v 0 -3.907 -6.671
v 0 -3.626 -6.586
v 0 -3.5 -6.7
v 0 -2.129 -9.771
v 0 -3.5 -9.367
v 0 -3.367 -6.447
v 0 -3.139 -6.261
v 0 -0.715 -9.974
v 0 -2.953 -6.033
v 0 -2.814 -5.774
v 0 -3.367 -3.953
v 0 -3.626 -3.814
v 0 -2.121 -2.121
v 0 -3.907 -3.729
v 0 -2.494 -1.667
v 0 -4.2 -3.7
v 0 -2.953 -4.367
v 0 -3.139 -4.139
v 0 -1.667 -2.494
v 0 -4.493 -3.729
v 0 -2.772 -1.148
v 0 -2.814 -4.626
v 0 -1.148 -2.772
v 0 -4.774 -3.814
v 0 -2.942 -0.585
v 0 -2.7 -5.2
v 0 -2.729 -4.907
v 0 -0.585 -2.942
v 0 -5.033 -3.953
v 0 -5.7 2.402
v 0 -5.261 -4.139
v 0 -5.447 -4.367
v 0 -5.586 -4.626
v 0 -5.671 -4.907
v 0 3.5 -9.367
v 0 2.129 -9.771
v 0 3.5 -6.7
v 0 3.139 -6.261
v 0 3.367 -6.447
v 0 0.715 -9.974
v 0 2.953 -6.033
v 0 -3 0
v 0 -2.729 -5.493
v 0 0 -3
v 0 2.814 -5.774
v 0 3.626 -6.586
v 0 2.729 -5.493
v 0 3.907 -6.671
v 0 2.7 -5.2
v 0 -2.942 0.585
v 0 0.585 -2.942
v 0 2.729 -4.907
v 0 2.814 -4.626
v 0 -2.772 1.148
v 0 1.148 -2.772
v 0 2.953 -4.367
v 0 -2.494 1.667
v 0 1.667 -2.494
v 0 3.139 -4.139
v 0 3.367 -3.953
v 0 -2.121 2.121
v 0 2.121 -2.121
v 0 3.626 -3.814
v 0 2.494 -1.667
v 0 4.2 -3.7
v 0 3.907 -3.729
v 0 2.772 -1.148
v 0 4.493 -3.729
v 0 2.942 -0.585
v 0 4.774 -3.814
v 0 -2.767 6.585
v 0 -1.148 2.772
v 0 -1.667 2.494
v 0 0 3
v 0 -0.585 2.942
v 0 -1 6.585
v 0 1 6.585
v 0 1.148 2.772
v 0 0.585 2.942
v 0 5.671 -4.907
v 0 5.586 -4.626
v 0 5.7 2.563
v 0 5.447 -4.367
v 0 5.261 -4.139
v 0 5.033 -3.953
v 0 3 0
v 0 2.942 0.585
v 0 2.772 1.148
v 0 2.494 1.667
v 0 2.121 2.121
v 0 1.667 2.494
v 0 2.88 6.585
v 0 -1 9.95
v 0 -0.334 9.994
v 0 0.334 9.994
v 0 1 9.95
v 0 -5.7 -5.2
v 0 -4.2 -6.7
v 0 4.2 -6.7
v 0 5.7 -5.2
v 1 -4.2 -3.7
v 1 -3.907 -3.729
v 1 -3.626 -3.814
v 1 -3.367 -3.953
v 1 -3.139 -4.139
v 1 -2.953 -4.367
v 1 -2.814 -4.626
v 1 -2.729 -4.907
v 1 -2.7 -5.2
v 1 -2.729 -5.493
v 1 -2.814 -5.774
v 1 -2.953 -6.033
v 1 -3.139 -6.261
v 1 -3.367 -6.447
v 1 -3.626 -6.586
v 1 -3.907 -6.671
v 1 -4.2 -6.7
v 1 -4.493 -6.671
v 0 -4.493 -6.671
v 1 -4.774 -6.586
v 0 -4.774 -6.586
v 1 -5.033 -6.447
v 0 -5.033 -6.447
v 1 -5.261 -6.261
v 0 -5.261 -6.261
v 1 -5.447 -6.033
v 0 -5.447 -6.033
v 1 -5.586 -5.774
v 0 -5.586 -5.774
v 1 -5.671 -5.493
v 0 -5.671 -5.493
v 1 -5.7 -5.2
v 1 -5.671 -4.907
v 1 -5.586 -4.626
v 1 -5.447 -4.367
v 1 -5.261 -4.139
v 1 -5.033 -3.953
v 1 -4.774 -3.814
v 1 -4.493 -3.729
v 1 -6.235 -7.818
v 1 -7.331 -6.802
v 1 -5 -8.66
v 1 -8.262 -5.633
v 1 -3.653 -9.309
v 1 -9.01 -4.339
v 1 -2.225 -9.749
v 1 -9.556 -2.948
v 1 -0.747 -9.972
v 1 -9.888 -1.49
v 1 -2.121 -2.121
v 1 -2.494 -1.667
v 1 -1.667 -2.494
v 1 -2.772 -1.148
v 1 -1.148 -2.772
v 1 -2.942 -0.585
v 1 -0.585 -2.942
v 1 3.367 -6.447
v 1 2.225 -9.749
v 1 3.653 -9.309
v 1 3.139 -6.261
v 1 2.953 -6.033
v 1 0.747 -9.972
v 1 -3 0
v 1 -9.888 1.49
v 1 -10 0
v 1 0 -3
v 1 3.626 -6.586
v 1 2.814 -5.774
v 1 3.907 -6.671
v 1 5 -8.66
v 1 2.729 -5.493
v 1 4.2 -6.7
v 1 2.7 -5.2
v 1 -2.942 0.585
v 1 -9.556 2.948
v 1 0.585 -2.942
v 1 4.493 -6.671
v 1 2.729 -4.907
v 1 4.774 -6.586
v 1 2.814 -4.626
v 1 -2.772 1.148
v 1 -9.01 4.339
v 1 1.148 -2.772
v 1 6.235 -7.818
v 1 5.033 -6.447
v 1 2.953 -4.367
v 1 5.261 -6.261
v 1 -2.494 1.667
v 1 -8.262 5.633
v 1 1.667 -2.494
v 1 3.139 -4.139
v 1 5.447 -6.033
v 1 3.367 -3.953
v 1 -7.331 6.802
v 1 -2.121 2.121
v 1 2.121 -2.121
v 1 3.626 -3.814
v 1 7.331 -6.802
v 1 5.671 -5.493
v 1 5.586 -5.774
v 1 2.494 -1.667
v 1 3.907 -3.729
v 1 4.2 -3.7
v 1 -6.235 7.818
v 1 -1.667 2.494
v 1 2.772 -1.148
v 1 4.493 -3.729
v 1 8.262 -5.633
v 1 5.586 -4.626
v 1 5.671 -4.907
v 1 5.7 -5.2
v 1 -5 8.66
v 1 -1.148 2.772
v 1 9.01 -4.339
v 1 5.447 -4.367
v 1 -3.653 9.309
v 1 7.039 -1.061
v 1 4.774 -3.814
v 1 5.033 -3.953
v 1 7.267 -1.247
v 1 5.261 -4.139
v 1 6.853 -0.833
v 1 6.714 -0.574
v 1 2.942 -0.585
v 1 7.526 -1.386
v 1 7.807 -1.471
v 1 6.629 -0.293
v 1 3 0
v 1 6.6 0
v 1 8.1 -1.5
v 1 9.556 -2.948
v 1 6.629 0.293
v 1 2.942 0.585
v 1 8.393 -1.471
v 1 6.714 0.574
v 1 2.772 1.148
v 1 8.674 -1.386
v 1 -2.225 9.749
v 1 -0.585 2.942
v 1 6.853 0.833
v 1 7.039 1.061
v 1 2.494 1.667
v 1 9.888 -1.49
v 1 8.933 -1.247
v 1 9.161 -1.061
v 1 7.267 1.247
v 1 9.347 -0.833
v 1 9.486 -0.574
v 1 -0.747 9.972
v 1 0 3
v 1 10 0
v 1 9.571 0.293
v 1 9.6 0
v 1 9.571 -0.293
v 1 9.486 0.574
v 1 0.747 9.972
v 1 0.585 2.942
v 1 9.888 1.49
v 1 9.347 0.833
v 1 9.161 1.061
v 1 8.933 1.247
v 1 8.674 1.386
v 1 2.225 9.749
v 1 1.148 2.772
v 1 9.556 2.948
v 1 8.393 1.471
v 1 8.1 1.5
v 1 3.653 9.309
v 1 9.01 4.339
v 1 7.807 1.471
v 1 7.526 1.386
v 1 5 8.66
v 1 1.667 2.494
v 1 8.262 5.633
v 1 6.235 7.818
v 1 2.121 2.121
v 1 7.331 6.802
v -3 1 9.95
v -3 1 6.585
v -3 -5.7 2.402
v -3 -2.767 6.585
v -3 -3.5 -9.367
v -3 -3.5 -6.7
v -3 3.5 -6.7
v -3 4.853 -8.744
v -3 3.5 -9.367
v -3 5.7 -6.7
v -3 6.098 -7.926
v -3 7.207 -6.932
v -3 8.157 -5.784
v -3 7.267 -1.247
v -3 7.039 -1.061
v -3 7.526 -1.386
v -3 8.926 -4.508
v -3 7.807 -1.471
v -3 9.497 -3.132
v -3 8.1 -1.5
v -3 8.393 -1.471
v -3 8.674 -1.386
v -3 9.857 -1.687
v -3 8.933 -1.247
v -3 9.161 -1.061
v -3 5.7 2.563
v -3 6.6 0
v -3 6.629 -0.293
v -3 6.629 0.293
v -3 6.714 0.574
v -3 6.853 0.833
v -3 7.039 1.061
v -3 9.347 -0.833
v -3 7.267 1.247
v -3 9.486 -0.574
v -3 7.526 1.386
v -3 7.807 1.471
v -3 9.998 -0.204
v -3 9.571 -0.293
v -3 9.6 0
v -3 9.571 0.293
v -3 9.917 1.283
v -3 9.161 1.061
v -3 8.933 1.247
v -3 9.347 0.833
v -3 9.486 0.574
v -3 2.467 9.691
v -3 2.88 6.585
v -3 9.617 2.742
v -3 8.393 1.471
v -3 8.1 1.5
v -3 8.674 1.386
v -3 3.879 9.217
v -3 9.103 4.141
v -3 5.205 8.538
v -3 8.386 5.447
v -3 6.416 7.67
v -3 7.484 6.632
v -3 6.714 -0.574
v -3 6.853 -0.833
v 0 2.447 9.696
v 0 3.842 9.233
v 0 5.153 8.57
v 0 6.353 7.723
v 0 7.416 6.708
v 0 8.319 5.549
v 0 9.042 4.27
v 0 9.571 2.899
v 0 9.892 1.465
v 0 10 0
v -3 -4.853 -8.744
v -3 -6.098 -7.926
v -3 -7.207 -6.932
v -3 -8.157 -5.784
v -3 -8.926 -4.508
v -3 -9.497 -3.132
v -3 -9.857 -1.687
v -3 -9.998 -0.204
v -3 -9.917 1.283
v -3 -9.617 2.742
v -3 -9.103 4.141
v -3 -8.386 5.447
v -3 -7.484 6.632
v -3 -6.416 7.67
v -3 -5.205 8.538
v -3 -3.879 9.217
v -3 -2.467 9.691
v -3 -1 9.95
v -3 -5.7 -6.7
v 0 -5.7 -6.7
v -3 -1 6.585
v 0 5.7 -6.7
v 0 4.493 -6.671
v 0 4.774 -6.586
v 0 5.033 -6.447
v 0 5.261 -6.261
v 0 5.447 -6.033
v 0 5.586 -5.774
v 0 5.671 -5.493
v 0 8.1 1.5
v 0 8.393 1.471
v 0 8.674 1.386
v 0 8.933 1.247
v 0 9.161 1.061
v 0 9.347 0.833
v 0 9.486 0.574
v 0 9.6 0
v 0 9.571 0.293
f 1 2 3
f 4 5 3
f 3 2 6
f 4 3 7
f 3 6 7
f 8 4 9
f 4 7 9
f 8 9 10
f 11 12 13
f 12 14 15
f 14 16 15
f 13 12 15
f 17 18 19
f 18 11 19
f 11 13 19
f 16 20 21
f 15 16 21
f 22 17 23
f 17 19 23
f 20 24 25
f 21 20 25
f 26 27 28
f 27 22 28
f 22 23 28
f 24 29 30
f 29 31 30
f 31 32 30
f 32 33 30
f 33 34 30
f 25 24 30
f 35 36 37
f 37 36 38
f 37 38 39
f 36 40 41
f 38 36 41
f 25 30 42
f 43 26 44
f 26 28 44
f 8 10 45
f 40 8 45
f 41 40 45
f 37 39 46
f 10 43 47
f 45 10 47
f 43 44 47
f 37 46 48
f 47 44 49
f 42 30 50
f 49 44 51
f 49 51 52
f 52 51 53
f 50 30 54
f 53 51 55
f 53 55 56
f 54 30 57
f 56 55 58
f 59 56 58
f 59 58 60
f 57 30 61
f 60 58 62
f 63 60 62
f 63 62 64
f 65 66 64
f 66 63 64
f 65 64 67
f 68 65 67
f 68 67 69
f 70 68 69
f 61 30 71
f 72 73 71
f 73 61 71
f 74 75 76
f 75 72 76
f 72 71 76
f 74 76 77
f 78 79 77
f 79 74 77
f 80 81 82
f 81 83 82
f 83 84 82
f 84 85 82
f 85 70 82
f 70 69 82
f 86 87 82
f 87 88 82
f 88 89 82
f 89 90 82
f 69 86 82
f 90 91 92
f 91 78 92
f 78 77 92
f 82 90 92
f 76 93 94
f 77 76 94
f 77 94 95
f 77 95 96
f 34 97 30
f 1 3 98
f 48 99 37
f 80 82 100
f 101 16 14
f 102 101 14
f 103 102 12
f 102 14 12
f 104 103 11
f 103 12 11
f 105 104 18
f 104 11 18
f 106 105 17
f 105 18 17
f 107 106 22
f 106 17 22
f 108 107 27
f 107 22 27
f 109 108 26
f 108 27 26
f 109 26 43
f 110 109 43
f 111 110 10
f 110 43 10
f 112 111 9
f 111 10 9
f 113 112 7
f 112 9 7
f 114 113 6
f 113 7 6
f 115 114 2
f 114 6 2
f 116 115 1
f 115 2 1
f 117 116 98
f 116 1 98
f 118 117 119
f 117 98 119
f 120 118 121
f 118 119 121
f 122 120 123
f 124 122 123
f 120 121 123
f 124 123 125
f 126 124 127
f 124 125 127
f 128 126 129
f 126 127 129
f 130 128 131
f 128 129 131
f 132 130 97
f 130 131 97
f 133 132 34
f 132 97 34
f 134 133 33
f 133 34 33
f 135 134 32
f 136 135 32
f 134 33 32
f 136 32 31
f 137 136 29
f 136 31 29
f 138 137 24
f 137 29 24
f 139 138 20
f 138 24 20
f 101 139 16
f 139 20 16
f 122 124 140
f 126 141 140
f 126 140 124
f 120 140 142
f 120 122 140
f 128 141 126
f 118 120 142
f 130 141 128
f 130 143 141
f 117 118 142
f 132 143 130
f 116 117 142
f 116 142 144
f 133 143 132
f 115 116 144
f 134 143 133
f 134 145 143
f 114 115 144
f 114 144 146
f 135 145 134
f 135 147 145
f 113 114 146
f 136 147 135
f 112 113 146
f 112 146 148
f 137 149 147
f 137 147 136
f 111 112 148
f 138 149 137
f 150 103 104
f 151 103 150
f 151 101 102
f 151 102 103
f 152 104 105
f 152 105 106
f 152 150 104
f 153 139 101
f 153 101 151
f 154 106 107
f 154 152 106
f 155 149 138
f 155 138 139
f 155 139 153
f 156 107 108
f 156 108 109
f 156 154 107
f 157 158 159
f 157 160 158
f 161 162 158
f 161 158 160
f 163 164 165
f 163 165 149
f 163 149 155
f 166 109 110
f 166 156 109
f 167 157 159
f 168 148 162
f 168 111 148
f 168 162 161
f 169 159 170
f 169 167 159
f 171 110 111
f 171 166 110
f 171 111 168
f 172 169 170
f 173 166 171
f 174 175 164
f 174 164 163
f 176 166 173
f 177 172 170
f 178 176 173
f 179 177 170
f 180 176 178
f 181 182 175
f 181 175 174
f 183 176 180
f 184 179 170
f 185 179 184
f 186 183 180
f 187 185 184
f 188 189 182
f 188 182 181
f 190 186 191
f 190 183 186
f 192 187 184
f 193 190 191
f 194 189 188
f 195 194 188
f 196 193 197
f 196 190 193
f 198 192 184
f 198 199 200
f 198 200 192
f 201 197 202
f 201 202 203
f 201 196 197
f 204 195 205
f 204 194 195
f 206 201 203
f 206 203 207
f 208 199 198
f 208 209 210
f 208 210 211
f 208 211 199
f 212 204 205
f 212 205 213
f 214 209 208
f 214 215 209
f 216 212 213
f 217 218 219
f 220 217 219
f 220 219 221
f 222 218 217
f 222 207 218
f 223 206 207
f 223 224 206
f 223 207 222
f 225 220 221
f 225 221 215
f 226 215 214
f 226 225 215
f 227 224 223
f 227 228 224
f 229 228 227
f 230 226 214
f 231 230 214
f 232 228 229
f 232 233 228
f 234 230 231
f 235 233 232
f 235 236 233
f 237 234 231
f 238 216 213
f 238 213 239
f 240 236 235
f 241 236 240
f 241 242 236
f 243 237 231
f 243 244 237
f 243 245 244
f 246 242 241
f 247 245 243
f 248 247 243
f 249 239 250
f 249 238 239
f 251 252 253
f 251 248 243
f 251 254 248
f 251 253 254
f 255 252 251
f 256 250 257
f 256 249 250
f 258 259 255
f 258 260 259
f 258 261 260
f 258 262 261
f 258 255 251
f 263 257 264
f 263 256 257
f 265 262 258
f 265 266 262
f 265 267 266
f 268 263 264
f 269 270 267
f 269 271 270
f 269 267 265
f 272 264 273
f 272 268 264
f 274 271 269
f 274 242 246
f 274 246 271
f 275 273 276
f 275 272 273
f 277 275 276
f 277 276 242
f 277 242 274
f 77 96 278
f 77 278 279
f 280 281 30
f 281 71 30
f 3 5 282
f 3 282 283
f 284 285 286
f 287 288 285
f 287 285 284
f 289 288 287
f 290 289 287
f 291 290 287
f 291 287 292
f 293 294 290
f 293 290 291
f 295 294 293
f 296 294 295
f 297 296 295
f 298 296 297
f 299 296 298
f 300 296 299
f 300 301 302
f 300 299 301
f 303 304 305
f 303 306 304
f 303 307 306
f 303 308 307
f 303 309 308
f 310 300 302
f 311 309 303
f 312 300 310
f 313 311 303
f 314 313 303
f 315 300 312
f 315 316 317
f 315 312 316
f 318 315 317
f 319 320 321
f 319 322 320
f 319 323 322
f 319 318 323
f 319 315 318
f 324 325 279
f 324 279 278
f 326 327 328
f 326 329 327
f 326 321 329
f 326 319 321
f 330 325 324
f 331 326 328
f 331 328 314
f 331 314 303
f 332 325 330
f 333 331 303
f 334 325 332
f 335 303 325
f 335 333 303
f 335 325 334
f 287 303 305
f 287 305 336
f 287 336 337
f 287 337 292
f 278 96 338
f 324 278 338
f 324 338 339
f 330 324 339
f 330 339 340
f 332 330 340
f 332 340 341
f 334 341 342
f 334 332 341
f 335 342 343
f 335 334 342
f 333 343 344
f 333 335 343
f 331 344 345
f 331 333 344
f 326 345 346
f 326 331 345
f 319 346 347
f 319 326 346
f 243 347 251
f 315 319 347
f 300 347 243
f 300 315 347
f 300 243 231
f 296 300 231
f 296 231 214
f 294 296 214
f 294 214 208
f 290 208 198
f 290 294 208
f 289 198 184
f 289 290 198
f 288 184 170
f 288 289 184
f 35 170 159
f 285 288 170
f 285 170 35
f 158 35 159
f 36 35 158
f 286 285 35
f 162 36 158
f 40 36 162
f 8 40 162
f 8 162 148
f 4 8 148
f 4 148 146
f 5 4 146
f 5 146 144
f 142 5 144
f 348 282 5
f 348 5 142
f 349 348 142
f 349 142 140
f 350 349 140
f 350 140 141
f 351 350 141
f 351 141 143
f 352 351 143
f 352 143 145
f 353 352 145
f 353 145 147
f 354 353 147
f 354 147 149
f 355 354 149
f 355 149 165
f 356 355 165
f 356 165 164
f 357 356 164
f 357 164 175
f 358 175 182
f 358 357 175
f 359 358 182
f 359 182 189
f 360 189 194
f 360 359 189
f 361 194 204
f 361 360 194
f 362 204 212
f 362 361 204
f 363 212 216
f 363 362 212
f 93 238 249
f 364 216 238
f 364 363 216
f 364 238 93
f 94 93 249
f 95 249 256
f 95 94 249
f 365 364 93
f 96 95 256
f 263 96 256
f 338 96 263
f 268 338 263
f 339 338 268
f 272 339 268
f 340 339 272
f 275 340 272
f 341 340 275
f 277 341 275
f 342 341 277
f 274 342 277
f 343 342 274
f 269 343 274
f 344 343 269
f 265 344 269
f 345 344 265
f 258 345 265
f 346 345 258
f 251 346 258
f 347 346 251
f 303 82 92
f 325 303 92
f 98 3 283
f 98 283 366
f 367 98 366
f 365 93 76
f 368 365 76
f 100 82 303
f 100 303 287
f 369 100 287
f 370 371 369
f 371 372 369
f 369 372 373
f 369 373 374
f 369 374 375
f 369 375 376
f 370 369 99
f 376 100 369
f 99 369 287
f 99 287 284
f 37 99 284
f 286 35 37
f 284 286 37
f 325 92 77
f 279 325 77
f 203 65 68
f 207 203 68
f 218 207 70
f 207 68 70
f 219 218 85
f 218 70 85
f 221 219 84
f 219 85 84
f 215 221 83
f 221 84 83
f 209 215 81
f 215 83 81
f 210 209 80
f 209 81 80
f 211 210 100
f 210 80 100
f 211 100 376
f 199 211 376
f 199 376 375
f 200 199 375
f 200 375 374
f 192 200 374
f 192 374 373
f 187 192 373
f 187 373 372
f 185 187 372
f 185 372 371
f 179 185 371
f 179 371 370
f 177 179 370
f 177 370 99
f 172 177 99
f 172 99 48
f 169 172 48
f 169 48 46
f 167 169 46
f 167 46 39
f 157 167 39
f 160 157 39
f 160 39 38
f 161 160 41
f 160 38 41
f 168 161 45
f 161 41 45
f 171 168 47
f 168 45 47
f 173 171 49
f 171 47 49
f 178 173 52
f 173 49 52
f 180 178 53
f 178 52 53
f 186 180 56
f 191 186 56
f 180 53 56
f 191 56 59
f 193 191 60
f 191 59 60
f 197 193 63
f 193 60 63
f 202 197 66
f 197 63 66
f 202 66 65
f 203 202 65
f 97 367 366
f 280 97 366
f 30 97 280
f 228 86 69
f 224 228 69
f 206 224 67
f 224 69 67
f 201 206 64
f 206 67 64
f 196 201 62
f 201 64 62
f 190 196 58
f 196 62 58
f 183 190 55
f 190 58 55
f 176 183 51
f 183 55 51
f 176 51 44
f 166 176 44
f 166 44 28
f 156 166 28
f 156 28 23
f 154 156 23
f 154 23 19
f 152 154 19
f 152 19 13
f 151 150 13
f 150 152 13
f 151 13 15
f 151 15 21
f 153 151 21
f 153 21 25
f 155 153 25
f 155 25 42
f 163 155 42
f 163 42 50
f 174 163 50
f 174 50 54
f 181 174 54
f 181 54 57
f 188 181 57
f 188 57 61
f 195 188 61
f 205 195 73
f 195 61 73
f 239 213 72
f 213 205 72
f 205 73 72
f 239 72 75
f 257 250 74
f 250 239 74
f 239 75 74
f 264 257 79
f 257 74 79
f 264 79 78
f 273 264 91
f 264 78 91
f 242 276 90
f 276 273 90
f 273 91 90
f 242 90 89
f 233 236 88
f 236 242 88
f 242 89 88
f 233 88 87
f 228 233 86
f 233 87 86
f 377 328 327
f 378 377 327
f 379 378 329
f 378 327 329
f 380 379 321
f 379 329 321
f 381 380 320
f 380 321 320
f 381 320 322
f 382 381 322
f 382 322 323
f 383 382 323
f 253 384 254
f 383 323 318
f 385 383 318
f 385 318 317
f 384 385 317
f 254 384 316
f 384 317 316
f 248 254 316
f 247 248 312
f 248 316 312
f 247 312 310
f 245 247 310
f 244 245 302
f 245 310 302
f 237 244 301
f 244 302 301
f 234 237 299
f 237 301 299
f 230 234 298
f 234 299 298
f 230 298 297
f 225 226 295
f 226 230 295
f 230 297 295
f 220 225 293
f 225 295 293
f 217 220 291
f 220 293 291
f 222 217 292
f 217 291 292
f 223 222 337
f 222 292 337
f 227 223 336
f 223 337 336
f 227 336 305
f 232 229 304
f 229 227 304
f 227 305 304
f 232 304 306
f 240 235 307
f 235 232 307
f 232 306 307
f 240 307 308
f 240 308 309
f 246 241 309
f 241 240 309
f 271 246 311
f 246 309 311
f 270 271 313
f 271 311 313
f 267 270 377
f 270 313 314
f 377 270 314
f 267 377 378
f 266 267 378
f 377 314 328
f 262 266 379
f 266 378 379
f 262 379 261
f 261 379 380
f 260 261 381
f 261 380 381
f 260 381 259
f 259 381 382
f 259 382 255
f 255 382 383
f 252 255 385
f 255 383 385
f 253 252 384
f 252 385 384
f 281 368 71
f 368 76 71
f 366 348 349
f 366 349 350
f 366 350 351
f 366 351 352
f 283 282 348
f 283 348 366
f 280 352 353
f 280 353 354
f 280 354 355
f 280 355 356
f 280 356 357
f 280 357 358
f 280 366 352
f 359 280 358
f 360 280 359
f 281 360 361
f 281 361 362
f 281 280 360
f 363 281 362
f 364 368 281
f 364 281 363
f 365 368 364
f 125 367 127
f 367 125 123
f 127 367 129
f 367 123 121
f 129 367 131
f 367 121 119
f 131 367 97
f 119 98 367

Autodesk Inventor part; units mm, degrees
ref_plane "YZ Plane" through (0, 0, 0) normal (1, 0, 0) x (0, 1, 0)
ref_plane "XZ Plane" through (0, 0, 0) normal (0, 1, 0) x (-1, 0, 0)
ref_plane "XY Plane" through (0, 0, 0) normal (0, 0, 1) x (1, 0, 0)
sketch "Sketch1" plane through (0, 0, 0) normal (1, 0, 0) x (0, 1, 0)
  circle A0 centre (0, 0) radius 10
  line L0 (10, 0) -> (8.1, 0)
  circle A1 centre (8.1, 0) radius 1.5
  circle A2 centre (0, 0) radius 3
  dimension "d0" = 20
  dimension "d1" = 1.9
  dimension "d2" = 3
  dimension "d3" = 6
extrude "Extrusion1" add sketch "Sketch1" along normal blind 1
sketch "Sketch2" plane through (0, 0, 0) normal (-1, 0, 0) x (0, 0, 1)
  line L0 (0, 5.5) -> (-6.5, 5.5)
  line L1 (0, 5.5) -> (2.5, 5.5)
  line L2 (6.0478, 3.0122) -> (6.0478, -2.8019)
  line L3 (-6.5, -5.5) -> (-6.5, 5.5)
  line L4 (5.5, 5.498) -> (2.5, 5.5)
  line L5 (2.5, 5.5) -> (6.0478, 3.0122)
  line L6 (5.2, -5.498) -> (2.2, -5.5)
  line L7 (2.2, -5.5) -> (6.0478, -2.8019)
  line L8 (2.2, -5.5) -> (-6.5, -5.5)
  line L9 (2.5631, 5.7) -> (6.585, 2.8798)
  line L10 (6.585, 2.8798) -> (6.585, -2.7667)
  line L11 (6.585, -2.7667) -> (2.4018, -5.7)
  line L12 (2.5631, 5.7) -> (0, 5.7)
  line L13 (0, 5.7) -> (-6.7, 5.7)
  line L14 (-6.7, 5.7) -> (-6.7, -5.7)
  line L15 (-6.7, -5.7) -> (2.4018, -5.7)
  circle A0 centre (0, 0) radius 10
  circle A1 centre (0, 0) radius 10 projected
  line L16 (10, 0) -> (10, 1)
  line L17 (10, 1) -> (6.585, 1)
  line L18 (10, 0) -> (10, -1)
  line L19 (10, 0) -> (11, 0) construction
  line L20 (10, -1) -> (6.585, -1)
  line L21 (-10, 0) -> (-10, 3.5)
  line L22 (-10, 3.5) -> (-6.7, 3.5)
  line L23 (-10, 0) -> (-10, -3.5)
  line L24 (-10, -3.5) -> (-6.7, -3.5)
  circle A2 centre (0, 8.1) radius 1.5 projected
  circle A3 centre (0, 8.1) radius 1.5
  point P0 (-9.3675, -3.5)
  point P1 (9.9499, -1)
  point P2 (9.9499, 1)
  point P3 (-9.3675, 3.5)
  dimension "d6" = 5.5
  dimension "d7" = 6.5
  dimension "d8" = 5.5
  dimension "d9" = 11
  dimension "d10" = 3
  dimension "d11" = 35
  dimension "d12" = 3
  dimension "d13" = 35
  dimension "d14" = 0.2
  dimension "d15" = 0.2
  dimension "d18" = 1
  dimension "d19" = 1
  dimension "d20" = 270
  dimension "d21" = 3.5
  dimension "d22" = 3.5
extrude "Extrusion2" add sketch "Sketch2" along normal blind 3 contours L9 L12 L13 L14 L22 A0 L17 L10 | L11 L10 L20 A0 L24 L14 L15
sketch "Sketch3" plane through (0, 0, 0) normal (-1, 0, 0) x (0, 0, 1)
  circle A0 centre (-5.2, 4.2) radius 1.5
  circle A1 centre (-5.2, -4.2) radius 1.5
  line L0 (-6.7, 5.7) -> (2.5631, 5.7) projected
  line L1 (-6.7, 3.5) -> (-6.7, 5.7) projected
  line L2 (-6.7, -5.7) -> (-6.7, -3.5) projected
  line L3 (2.4018, -5.7) -> (-6.7, -5.7) projected
  point P0 (0, 0)
  dimension "d23" = 3
  dimension "d24" = 3
extrude "Extrusion3" cut sketch "Sketch3" against normal blind 10 contours A0 | A1
properties part number "potentiometer_holder"
